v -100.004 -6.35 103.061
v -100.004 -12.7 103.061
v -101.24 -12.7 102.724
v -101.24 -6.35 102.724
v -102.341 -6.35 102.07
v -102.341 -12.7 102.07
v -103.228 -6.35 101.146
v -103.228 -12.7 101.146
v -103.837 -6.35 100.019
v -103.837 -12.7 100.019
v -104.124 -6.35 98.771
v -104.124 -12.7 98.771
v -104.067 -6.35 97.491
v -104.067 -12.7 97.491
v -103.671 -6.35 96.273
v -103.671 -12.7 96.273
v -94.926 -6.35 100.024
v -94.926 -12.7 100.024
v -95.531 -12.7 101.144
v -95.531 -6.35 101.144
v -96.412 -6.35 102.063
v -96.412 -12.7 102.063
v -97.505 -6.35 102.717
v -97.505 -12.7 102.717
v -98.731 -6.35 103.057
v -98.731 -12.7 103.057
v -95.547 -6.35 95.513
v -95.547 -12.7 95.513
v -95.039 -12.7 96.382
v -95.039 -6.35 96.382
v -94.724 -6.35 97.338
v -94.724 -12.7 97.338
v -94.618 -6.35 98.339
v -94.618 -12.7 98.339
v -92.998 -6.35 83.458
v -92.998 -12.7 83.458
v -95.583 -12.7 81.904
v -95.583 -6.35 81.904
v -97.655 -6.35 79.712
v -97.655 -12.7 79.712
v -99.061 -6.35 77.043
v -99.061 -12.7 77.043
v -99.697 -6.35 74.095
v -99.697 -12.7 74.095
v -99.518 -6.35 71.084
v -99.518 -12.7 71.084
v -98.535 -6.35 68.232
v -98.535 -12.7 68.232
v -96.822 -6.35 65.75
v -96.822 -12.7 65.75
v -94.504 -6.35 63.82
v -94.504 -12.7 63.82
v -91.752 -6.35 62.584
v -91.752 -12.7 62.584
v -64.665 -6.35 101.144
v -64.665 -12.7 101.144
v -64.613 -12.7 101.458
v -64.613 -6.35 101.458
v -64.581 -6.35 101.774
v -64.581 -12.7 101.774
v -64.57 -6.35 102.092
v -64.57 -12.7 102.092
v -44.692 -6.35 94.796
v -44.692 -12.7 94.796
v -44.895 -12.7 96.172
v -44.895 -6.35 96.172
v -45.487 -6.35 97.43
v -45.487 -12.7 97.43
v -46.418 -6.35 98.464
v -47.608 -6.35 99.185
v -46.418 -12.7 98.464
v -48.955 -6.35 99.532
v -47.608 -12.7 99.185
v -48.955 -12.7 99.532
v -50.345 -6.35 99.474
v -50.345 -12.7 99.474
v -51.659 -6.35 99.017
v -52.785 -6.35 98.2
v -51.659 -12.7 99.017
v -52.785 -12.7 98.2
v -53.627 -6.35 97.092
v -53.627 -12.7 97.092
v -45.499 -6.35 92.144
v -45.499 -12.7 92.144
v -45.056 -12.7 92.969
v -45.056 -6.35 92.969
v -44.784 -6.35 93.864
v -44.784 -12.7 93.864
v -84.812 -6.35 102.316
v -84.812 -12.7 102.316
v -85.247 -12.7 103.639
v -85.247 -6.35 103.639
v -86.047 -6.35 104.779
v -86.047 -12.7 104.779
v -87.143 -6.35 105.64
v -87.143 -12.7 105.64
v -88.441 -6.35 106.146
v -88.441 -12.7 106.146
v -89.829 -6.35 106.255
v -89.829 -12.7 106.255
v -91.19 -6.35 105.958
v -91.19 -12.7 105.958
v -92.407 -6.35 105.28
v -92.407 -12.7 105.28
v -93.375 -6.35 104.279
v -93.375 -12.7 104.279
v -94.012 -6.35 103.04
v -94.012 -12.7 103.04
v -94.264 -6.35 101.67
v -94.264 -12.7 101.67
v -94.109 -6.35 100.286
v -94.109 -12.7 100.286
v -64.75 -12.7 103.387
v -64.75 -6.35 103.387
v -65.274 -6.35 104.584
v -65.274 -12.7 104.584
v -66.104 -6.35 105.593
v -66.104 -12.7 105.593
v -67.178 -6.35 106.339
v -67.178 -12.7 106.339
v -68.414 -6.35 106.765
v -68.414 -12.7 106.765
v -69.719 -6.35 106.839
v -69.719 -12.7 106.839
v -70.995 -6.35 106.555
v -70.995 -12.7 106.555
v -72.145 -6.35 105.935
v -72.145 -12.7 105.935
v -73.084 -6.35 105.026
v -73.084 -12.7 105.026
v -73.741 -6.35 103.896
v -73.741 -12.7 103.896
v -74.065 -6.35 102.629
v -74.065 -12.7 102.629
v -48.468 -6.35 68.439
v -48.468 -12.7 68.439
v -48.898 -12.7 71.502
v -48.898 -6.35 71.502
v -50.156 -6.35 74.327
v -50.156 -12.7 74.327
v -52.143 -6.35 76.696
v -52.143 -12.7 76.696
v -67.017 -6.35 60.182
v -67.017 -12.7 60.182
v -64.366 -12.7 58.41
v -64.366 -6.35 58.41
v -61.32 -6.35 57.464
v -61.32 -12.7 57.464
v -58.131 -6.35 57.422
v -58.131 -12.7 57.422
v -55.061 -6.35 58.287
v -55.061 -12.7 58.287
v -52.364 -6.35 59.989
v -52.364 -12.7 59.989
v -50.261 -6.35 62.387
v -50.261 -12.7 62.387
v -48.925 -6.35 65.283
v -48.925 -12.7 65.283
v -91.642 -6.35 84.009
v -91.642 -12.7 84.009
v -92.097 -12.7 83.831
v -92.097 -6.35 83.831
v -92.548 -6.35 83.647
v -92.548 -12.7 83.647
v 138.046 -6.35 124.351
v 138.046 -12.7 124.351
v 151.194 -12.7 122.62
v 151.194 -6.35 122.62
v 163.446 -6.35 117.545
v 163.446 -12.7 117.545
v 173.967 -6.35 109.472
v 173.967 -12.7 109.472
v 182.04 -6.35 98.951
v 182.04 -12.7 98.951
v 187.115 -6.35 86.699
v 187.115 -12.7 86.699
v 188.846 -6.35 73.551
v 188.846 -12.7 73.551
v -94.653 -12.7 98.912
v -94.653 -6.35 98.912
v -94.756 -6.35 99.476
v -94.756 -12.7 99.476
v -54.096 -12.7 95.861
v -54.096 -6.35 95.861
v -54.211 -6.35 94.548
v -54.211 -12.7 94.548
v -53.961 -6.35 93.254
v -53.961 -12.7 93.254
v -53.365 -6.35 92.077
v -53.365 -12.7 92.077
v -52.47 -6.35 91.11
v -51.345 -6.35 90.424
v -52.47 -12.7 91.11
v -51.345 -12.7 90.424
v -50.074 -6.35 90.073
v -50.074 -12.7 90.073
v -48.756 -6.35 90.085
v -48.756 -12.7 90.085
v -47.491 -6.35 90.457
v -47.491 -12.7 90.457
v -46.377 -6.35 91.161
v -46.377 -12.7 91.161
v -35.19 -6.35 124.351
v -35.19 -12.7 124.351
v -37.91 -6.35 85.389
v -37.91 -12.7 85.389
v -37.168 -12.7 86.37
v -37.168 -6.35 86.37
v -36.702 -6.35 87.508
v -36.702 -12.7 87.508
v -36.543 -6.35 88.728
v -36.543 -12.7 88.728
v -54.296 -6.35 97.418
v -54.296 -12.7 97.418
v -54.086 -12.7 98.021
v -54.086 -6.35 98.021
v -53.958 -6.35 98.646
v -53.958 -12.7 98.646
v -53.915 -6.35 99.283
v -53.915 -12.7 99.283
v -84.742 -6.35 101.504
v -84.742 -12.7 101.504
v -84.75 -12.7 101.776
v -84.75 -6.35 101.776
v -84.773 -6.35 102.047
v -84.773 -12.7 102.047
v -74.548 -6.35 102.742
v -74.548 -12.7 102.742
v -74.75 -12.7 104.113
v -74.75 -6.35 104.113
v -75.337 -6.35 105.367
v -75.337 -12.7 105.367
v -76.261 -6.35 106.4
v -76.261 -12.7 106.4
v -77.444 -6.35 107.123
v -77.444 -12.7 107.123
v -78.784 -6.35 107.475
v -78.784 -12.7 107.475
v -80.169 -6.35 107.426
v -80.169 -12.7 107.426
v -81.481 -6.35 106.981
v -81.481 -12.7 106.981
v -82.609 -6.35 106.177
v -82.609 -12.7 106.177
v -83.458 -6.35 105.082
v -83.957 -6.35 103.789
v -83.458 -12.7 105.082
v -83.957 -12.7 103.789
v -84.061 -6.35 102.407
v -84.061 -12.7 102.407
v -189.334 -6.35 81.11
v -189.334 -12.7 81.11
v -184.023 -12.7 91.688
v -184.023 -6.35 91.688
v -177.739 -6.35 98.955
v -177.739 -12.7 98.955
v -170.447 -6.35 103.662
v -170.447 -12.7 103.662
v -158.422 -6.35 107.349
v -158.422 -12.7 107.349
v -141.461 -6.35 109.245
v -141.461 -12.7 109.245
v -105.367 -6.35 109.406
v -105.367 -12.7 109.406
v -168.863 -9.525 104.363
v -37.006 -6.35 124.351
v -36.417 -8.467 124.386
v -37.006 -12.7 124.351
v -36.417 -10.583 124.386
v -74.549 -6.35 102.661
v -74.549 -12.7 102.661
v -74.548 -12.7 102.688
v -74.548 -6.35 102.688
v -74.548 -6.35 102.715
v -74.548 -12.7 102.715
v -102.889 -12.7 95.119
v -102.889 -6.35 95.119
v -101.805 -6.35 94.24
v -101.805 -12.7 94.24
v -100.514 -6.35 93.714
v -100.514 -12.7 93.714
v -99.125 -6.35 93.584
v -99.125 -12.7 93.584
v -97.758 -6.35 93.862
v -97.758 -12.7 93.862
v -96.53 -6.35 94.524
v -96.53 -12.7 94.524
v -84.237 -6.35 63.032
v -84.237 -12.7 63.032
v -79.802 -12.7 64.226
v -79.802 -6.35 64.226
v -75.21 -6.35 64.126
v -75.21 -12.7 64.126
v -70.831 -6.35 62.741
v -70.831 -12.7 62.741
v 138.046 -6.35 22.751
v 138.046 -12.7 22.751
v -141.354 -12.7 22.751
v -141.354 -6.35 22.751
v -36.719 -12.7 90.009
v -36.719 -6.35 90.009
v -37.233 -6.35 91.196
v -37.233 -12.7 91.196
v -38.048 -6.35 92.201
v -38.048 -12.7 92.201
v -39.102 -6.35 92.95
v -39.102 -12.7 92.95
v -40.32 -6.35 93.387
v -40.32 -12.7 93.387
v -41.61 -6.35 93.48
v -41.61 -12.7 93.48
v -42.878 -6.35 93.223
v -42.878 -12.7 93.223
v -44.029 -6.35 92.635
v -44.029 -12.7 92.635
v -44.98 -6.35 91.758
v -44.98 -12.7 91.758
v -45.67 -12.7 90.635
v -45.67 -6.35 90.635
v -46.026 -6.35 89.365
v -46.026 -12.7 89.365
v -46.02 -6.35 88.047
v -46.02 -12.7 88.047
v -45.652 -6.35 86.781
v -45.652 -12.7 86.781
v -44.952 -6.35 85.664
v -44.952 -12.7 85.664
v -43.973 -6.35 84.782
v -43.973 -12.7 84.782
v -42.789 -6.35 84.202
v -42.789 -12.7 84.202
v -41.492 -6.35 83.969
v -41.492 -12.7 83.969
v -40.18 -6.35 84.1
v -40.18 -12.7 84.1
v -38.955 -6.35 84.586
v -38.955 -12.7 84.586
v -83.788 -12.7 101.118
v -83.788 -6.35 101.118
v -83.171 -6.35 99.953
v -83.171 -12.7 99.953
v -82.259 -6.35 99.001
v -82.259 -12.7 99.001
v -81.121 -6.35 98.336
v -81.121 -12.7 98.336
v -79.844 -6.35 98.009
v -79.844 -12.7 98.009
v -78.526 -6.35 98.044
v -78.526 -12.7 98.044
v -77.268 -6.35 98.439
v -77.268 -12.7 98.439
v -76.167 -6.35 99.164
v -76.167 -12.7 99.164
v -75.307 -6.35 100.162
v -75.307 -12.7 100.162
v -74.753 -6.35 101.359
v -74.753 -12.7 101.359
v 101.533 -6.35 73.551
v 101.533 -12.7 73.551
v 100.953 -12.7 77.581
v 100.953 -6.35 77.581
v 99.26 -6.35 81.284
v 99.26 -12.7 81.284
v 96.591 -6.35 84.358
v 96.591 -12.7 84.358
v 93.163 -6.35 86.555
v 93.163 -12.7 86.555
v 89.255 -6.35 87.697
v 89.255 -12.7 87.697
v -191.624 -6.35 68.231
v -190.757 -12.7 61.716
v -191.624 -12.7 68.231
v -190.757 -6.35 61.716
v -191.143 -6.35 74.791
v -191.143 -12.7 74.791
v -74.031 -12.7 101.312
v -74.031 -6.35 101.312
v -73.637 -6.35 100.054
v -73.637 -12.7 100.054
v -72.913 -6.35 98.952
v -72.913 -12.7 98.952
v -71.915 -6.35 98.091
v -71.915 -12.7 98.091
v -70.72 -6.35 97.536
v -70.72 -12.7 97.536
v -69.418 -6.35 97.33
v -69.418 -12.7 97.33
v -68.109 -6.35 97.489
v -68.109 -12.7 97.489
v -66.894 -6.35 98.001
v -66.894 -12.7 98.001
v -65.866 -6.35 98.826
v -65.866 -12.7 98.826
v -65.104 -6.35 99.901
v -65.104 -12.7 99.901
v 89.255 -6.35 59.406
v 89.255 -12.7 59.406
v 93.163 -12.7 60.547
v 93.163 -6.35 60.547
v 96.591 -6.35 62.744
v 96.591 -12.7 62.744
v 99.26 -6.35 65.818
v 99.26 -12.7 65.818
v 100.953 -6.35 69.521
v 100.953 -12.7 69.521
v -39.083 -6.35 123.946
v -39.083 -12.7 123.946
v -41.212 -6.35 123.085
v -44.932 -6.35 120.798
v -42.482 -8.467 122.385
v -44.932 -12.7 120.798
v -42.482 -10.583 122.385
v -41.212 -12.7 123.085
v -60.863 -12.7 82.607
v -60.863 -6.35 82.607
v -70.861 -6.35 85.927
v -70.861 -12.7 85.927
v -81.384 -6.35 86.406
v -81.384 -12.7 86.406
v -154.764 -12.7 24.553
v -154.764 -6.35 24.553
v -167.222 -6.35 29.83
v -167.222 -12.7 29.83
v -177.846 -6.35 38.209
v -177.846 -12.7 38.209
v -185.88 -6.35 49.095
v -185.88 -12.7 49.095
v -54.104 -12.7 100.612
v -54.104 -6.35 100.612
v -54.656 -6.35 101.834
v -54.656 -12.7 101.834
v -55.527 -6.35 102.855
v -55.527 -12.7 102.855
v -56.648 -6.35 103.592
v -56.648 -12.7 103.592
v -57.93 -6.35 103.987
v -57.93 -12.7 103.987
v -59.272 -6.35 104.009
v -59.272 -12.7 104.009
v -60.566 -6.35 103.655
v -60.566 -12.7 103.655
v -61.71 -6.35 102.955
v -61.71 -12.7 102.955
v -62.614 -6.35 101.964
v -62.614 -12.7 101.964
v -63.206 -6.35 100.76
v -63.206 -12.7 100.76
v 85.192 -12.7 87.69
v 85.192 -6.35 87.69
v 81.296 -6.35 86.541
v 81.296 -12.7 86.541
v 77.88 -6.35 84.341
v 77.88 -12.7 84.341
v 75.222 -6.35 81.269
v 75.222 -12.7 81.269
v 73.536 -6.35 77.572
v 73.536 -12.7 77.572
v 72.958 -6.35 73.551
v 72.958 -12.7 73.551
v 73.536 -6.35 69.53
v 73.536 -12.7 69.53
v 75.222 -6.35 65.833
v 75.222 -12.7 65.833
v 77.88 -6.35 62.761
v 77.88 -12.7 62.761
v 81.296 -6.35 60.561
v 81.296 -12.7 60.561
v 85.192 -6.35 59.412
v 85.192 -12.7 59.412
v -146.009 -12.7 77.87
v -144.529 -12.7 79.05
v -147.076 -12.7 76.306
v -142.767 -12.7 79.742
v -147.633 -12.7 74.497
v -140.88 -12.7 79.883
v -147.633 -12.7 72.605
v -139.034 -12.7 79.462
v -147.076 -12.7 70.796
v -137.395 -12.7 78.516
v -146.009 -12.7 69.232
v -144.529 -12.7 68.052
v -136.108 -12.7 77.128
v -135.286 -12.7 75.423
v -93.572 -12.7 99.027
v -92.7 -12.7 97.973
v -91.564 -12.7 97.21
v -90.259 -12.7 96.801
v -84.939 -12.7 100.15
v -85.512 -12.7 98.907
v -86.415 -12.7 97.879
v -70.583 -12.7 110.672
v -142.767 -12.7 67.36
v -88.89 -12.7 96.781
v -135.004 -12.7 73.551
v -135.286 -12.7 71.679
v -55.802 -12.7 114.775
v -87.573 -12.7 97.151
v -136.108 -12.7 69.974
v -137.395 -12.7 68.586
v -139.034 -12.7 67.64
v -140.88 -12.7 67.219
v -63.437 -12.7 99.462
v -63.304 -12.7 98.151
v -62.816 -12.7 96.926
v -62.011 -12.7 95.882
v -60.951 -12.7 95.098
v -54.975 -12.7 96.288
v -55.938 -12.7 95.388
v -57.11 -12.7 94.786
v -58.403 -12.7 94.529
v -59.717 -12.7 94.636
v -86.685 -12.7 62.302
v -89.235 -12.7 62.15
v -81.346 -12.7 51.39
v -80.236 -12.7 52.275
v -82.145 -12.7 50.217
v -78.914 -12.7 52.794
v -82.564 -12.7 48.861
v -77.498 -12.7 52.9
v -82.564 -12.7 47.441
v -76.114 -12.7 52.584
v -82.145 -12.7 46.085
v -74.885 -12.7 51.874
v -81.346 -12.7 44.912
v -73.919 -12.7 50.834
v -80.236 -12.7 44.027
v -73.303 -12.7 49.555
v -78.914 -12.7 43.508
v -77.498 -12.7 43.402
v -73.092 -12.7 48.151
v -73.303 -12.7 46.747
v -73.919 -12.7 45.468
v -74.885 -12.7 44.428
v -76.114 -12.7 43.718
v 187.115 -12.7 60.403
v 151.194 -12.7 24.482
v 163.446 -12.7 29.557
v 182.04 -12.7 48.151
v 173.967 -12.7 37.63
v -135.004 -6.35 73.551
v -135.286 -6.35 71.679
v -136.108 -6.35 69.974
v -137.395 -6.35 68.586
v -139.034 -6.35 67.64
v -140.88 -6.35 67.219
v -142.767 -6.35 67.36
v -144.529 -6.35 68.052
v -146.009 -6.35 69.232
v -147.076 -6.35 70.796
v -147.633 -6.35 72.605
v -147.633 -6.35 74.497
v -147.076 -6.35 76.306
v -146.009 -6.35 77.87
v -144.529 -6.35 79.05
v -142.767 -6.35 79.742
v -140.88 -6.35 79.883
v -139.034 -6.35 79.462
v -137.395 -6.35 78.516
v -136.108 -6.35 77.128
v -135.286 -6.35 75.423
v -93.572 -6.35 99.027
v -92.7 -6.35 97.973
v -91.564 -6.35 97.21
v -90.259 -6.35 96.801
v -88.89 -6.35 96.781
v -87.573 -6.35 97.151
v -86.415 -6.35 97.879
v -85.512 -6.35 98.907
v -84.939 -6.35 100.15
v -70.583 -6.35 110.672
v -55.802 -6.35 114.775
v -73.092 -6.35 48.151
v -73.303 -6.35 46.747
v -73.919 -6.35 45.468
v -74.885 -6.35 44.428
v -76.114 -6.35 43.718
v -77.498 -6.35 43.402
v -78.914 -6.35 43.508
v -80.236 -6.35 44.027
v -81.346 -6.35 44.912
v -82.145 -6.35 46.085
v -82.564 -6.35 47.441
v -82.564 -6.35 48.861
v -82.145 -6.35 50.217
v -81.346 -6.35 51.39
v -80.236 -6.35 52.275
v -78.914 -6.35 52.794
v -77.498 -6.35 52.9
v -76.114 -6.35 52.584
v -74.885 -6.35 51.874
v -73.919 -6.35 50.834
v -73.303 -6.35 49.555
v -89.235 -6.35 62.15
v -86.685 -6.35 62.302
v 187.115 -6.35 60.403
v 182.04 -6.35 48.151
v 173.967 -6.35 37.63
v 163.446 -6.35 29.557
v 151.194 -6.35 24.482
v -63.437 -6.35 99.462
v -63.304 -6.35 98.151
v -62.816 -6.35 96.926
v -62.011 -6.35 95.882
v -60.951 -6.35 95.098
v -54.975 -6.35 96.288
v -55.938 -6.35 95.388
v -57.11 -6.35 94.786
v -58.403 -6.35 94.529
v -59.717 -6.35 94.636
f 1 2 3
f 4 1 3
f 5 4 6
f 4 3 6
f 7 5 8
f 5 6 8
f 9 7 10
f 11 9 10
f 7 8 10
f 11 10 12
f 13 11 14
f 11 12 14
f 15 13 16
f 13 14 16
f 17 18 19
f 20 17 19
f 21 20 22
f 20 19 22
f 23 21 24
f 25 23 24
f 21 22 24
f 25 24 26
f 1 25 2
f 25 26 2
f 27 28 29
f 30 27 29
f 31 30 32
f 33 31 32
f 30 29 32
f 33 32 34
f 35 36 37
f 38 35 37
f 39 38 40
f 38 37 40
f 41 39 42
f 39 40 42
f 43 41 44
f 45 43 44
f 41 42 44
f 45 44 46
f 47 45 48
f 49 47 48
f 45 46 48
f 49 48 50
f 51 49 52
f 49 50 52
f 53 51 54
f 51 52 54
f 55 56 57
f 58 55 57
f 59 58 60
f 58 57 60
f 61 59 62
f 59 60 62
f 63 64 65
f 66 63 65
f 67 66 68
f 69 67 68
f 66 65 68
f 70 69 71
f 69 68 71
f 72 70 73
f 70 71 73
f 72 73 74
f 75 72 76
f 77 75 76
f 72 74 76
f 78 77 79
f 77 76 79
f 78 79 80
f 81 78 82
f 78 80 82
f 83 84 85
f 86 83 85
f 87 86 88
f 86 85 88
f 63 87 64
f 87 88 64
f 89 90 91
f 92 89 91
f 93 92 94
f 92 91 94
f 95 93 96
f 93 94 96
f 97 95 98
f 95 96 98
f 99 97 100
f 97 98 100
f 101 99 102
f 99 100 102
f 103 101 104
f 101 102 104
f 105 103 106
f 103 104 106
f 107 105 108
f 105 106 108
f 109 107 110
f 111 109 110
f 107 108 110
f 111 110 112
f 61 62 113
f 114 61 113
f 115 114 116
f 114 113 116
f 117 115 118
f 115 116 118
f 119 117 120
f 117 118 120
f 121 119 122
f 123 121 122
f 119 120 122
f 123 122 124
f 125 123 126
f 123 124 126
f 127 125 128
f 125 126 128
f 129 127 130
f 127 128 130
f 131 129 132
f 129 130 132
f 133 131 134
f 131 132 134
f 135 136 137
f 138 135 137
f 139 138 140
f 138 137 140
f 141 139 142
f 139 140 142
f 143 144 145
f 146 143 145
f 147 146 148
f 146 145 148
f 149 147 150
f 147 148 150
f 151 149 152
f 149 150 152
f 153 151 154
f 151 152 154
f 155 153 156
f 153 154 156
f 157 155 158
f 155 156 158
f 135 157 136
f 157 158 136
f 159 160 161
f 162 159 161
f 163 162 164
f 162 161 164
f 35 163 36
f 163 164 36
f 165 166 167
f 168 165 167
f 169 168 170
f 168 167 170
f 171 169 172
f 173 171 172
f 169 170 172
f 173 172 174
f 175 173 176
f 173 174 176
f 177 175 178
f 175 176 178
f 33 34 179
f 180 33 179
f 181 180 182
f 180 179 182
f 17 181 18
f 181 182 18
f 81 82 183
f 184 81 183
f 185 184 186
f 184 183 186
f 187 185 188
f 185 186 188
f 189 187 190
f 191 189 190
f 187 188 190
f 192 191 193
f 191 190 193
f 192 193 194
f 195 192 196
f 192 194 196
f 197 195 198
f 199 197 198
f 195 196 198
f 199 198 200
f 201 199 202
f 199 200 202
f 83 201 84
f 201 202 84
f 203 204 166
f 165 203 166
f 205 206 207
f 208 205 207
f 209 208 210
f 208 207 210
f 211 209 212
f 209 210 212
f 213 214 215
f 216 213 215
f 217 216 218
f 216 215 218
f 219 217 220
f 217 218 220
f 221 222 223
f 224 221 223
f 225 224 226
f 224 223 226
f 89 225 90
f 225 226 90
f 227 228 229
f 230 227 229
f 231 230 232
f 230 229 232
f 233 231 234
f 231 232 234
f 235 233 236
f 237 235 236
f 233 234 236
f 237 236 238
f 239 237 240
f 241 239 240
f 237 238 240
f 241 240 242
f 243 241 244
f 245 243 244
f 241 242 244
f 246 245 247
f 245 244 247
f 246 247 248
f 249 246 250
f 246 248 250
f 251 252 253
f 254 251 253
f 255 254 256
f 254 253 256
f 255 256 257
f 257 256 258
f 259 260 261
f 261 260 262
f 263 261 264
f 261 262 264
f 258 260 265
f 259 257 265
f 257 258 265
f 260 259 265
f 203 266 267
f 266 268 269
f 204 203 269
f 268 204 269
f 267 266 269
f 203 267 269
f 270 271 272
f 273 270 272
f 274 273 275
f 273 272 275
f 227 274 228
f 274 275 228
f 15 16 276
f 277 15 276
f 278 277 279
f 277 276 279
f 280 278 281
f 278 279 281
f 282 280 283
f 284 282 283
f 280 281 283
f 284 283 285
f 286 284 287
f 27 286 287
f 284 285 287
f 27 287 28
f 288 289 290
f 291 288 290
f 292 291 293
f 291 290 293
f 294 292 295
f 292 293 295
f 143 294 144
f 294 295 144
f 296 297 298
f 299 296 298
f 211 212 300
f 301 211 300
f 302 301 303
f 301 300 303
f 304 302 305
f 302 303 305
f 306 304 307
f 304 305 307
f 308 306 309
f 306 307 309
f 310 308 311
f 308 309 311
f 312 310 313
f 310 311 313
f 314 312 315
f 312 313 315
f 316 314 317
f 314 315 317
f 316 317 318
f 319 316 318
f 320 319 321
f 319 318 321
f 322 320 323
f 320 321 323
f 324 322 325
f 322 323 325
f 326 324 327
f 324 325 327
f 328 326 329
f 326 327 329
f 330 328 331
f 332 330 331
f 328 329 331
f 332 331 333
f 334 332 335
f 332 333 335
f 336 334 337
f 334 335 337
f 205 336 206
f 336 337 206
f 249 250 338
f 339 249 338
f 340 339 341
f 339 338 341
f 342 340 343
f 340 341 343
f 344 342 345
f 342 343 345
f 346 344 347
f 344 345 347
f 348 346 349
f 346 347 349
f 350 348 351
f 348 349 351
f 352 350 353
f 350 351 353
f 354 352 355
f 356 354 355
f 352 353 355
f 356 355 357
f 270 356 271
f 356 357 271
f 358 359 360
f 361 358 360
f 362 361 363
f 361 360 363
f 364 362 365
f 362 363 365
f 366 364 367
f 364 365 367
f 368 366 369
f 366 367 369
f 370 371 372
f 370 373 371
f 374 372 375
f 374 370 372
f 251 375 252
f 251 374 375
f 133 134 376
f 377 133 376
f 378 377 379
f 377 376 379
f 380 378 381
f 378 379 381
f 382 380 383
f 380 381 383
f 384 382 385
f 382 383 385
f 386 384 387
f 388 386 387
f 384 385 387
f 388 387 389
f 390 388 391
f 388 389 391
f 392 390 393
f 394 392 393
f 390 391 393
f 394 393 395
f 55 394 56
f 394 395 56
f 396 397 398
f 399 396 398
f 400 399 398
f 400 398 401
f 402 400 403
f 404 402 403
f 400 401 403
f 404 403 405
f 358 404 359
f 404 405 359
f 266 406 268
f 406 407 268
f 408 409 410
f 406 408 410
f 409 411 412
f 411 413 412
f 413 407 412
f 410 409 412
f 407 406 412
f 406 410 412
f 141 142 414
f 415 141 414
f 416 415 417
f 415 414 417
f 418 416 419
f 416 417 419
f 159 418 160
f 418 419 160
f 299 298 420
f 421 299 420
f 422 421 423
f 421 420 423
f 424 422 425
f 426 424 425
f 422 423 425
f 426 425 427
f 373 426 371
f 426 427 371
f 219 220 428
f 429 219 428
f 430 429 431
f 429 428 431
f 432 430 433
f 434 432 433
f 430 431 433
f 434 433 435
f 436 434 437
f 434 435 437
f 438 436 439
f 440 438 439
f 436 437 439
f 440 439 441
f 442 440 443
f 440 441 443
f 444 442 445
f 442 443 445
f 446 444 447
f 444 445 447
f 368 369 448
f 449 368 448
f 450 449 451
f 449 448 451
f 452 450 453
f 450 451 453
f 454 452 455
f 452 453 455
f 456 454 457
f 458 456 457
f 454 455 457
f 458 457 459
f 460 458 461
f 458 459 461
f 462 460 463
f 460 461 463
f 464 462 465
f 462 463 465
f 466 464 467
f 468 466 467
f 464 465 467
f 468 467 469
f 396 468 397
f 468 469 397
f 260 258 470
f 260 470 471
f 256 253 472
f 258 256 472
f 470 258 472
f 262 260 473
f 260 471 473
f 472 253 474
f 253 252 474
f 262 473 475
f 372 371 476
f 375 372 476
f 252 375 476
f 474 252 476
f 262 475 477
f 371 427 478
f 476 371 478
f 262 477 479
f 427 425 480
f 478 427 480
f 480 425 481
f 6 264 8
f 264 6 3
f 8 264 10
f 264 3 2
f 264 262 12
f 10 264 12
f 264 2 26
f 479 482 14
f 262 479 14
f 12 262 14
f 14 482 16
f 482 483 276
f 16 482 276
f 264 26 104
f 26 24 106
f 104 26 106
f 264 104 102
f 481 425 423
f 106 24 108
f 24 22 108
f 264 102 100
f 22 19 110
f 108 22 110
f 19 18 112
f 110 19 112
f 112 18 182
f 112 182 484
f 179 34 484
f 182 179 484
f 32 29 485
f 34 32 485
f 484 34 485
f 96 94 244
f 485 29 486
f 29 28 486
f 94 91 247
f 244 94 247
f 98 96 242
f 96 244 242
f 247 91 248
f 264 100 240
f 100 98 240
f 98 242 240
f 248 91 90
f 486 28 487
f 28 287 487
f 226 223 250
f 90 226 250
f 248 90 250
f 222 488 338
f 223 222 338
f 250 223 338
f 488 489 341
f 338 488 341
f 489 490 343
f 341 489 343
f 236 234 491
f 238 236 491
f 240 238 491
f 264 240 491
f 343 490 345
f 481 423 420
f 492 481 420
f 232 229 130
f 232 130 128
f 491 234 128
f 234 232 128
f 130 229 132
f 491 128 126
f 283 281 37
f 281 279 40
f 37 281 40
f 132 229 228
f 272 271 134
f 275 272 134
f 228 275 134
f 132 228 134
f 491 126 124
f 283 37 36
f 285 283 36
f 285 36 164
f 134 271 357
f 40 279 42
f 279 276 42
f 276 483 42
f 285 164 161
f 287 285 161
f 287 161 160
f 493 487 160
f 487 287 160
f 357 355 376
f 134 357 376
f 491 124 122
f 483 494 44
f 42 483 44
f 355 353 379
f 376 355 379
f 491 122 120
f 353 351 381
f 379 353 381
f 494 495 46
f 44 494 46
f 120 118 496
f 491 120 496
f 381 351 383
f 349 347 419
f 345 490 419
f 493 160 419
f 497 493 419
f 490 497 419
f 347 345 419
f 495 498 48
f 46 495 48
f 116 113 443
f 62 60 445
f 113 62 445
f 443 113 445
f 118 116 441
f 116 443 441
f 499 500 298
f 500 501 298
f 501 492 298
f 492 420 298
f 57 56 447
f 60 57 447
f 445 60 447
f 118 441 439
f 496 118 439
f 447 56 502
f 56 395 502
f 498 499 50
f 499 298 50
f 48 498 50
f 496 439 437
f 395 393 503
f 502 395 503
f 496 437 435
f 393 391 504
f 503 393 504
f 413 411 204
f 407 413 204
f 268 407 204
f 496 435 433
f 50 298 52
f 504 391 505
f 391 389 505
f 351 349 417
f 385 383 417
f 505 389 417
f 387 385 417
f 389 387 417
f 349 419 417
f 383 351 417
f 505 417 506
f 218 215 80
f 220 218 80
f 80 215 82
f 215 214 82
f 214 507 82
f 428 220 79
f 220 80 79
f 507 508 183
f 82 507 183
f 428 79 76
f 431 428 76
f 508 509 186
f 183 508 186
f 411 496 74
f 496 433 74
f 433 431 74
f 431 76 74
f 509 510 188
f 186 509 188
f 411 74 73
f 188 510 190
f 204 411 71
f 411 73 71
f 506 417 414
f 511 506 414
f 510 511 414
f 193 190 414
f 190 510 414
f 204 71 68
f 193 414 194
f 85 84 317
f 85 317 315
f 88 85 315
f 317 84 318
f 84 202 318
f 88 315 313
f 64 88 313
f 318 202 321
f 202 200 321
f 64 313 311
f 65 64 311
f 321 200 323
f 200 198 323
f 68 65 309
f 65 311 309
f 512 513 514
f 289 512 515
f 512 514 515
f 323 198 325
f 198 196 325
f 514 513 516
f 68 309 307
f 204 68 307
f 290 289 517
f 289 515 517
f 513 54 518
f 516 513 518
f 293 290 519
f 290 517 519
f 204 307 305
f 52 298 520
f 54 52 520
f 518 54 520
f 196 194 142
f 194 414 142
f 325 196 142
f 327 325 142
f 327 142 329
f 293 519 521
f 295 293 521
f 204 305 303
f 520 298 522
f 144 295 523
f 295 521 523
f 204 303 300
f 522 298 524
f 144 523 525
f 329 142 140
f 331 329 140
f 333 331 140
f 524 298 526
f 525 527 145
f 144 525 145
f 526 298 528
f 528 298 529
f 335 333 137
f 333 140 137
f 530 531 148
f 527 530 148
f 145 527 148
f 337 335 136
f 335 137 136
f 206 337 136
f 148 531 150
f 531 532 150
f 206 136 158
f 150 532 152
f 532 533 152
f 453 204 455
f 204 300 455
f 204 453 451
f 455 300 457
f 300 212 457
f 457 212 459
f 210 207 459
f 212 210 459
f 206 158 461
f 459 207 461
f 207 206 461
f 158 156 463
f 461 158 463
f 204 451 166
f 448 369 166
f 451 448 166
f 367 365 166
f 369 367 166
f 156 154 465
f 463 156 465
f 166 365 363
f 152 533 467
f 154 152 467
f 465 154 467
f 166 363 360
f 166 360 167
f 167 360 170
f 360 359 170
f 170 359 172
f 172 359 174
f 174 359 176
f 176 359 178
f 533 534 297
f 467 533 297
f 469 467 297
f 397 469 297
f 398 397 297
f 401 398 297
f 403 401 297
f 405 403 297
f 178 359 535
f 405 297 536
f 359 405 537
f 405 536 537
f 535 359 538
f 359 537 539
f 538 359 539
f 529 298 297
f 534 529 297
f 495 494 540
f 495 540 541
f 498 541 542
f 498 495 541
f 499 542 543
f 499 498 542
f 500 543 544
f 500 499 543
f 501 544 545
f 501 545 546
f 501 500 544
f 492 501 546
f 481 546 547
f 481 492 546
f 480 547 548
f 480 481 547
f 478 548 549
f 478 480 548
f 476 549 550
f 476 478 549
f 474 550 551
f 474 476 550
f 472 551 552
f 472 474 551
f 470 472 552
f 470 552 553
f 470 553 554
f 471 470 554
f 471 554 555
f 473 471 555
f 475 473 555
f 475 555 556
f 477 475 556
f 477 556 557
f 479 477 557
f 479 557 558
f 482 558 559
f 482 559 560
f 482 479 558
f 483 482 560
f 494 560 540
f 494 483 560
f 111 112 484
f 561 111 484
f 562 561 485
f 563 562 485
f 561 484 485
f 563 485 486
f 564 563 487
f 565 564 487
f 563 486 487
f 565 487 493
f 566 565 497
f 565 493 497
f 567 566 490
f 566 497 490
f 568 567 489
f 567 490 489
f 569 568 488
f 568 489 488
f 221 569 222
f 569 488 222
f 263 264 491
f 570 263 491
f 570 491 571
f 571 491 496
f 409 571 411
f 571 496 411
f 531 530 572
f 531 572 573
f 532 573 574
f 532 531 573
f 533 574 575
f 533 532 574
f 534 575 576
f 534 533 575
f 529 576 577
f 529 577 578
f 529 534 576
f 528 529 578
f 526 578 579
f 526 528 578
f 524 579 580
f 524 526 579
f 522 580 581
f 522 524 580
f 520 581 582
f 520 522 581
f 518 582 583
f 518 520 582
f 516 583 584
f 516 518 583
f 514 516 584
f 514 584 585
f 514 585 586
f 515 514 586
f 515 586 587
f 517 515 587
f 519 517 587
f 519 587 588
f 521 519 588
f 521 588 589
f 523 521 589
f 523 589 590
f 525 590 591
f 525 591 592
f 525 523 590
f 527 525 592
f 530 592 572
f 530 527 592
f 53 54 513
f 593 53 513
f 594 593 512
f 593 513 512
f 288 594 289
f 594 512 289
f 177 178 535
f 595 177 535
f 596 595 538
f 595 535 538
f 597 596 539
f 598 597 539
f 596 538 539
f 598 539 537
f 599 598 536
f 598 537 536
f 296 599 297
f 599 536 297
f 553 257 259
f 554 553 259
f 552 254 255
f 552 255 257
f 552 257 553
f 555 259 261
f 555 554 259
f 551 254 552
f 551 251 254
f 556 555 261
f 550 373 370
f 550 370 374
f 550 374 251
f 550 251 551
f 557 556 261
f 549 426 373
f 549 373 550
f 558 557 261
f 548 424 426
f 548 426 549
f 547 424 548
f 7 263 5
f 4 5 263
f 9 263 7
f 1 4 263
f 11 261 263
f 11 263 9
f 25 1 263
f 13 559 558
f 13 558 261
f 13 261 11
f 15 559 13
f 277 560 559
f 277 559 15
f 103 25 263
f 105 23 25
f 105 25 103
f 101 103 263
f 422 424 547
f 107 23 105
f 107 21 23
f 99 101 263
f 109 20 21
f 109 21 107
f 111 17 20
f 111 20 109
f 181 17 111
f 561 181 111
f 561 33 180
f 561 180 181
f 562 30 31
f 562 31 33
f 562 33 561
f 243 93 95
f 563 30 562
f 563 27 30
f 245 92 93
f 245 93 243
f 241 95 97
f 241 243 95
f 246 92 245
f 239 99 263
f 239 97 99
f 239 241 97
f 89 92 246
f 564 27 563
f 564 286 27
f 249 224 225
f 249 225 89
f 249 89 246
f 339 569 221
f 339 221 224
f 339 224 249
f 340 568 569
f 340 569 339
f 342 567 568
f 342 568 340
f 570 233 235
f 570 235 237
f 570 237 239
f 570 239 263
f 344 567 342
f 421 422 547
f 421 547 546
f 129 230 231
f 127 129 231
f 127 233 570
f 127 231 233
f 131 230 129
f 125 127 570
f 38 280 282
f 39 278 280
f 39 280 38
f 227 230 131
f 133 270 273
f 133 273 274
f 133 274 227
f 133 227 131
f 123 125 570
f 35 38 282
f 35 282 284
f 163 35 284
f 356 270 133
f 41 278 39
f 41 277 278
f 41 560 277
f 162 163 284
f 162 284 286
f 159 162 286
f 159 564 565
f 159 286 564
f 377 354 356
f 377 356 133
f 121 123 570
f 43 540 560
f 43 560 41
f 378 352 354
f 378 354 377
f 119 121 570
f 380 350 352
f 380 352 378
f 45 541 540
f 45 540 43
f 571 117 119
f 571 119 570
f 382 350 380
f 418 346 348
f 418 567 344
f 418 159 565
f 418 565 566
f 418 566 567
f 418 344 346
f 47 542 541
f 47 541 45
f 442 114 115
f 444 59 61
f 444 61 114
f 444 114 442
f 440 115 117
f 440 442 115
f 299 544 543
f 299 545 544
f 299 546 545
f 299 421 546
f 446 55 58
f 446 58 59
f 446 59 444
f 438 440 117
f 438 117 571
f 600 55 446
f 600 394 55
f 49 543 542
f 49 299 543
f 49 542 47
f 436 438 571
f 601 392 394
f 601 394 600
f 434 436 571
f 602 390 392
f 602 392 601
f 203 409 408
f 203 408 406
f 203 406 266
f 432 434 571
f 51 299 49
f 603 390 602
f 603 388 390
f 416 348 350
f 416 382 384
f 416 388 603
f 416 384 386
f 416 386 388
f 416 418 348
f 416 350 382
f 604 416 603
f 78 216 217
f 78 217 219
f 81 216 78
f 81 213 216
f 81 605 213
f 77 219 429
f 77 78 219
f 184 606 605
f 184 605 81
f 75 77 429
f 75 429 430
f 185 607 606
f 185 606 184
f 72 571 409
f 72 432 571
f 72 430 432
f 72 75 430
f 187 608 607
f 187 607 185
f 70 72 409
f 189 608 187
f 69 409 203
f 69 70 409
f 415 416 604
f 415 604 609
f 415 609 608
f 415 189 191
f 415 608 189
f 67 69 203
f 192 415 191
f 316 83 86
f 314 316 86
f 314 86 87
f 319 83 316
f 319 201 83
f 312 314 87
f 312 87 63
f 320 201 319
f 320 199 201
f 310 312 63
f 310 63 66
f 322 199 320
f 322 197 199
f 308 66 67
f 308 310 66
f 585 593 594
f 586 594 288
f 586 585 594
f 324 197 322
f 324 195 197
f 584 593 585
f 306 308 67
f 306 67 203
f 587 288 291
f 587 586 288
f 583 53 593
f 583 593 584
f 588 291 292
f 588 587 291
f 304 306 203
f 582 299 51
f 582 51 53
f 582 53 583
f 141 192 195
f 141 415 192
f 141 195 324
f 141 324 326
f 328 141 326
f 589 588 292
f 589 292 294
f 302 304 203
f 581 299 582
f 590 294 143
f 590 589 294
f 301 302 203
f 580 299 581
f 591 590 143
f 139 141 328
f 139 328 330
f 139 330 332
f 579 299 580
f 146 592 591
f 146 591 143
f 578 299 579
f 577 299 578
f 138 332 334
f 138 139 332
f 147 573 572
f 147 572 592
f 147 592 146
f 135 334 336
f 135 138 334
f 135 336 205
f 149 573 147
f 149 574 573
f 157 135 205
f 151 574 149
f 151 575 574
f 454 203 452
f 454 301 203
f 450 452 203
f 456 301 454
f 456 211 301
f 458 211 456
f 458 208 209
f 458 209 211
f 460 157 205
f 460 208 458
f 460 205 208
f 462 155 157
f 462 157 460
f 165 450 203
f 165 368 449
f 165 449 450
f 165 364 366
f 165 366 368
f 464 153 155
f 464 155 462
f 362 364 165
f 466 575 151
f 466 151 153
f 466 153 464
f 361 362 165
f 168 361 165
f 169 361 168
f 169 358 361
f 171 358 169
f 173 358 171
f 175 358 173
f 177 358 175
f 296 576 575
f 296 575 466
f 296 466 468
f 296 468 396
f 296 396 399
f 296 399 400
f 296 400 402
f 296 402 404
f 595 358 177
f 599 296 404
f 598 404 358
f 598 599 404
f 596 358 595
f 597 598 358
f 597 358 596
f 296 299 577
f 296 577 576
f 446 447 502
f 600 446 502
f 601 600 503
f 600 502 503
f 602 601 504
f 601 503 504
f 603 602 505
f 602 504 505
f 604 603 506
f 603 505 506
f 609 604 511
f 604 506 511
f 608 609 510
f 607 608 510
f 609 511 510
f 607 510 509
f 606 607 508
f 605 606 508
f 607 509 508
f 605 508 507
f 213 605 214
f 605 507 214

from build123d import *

# Parameters (mm, degrees)
F0_R     = 6.35
F0_R_2   = 4.7625
F1_DEPTH = 6.35
F2_R     = 32.0379747342
F3_ANGLE = 180


with BuildPart() as f1:
    # F0 (on Front) → F1 (new body)
    with BuildSketch(Plane.XZ):
        with BuildLine():
            add(Edge.make_bspline(
                [(-44.9317906939, -75.2959670142), (-42.504350489, -76.9309330496), (-40.0815580843, -78.574281615), (-37.0058182453, -78.848974732)],
                knots=[0, 0, 0, 0, 0.304878312, 0.304878312, 0.304878312, 0.304878312], degree=3))
            Line((-37.0058182453, -78.848974732), (-35.1899303496, -78.848974732))
            Line((-35.1899303496, -78.848974732), (138.0456507325, -78.848974732))
            ThreePointArc((138.0456507325, -78.848974732), (107.5329699783, -68.6644436224), (89.25483042, -42.1944988733))
            ThreePointArc((89.25483042, -42.1944988733), (72.9581507325, -28.048974732), (89.25483042, -13.9034505906))
            ThreePointArc((89.25483042, -13.9034505906), (107.5329699783, 12.5664941585), (138.0456507325, 22.751025268))
            Line((138.0456507325, 22.751025268), (-29.5108688384, 22.751025268))
            ThreePointArc((-29.5108688384, 22.751025268), (-23.7287326375, -9.9063657522), (-37.9096431739, -39.8870272468))
            ThreePointArc((-37.9096431739, -39.8870272468), (-36.8982172715, -41.4219866867), (-36.5434579184, -43.2256575657))
            ThreePointArc((-36.5434579184, -43.2256575657), (-39.6962005674, -47.7078542952), (-44.9802400795, -46.2556834486))
            ThreePointArc((-44.9802400795, -46.2556834486), (-45.2388732076, -46.4494635579), (-45.4986485664, -46.6417097247))
            ThreePointArc((-45.4986485664, -46.6417097247), (-44.8982077868, -47.9076096174), (-44.6921152233, -49.2934514277))
            ThreePointArc((-44.6921152233, -49.2934514277), (-48.2687720926, -53.9059542537), (-53.62657499, -51.5904403165))
            ThreePointArc((-53.62657499, -51.5904403165), (-53.9605685551, -51.7543648971), (-54.2956711641, -51.9160102225))
            ThreePointArc((-54.2956711641, -51.9160102225), (-54.0112987886, -52.8294235617), (-53.9152156835, -53.781242669))
            ThreePointArc((-53.9152156835, -53.781242669), (-57.9302793656, -58.484724911), (-63.2056073689, -55.2575905738))
            ThreePointArc((-63.2056073689, -55.2575905738), (-63.9341966135, -55.4550487206), (-64.6654456429, -55.6424169789))
            ThreePointArc((-64.6654456429, -55.6424169789), (-64.5940899046, -56.1138214868), (-64.5702249334, -56.589998255))
            ThreePointArc((-64.5702249334, -56.589998255), (-69.063627601, -61.3448897233), (-74.0648151174, -57.1273331041))
            ThreePointArc((-74.0648151174, -57.1273331041), (-74.3067807591, -57.1436245398), (-74.5488163621, -57.1588412904))
            ThreePointArc((-74.5488163621, -57.1588412904), (-74.5483033729, -57.1991961718), (-74.5481323724, -57.2395539515))
            ThreePointArc((-74.5481323724, -57.2395539515), (-79.4779726733, -61.9991131195), (-84.0613726764, -56.9050800143))
            ThreePointArc((-84.0613726764, -56.9050800143), (-84.4367274692, -56.8608221199), (-84.811766966, -56.8139674761))
            ThreePointArc((-84.811766966, -56.8139674761), (-90.5205103625, -60.6546823767), (-94.1086444598, -54.7838957332))
            ThreePointArc((-94.1086444598, -54.7838957332), (-94.5178427862, -54.6545521612), (-94.926012036, -54.5219969142))
            ThreePointArc((-94.926012036, -54.5219969142), (-96.9364048452, -56.9248041814), (-100.0044999501, -57.5588029495))
            ThreePointArc((-100.0044999501, -57.5588029495), (-102.555846588, -60.8409888487), (-105.3670203015, -63.9035721205))
            add(Edge.make_bspline(
                [(-105.3670203015, -63.9035721205), (-93.0623740032, -63.7395817927), (-65.1691332268, -63.6755764129), (-51.7450297958, -70.7164798851), (-44.9317906939, -75.2959670142)],
                knots=[0.5750167778, 0.5750167778, 0.5750167778, 0.5750167778, 0.7300492168, 0.9453128196, 0.9453128196, 0.9453128196, 0.9453128196], degree=3))
        make_face()
        with BuildLine():
            Line((-35.1899303496, -78.848974732), (-37.0058182453, -78.848974732))
            add(Edge.make_bspline(
                [(-37.0058182453, -78.848974732), (-36.4252596683, -78.9008241905), (-35.8214378024, -78.9039110297), (-35.1899303496, -78.848974732)],
                knots=[0.304878312, 0.304878312, 0.304878312, 0.304878312, 0.3624253505, 0.3624253505, 0.3624253505, 0.3624253505], degree=3))
        make_face()
        with BuildLine():
            ThreePointArc((89.25483042, -42.1944988733), (107.5329699783, -68.6644436224), (138.0456507325, -78.848974732))
            ThreePointArc((138.0456507325, -78.848974732), (173.9666752168, -63.9699992163), (188.8456507325, -28.048974732))
            ThreePointArc((188.8456507325, -28.048974732), (173.9666752168, 7.8720497523), (138.0456507325, 22.751025268))
            ThreePointArc((138.0456507325, 22.751025268), (107.5329699783, 12.5664941585), (89.25483042, -13.9034505906))
            ThreePointArc((89.25483042, -13.9034505906), (98.0354331918, -18.6834394706), (101.5331507325, -28.048974732))
            ThreePointArc((101.5331507325, -28.048974732), (98.0354331918, -37.4145099934), (89.25483042, -42.1944988733))
        make_face()
        with BuildLine():
            add(Edge.make_bspline(
                [(-192.1543492675, -28.048974732), (-187.686217537, -40.4827740106), (-178.5952669037, -65.7808319564), (-128.5743222399, -64.2128677281), (-105.3670203015, -63.9035721205)],
                knots=[0, 0, 0, 0, 0.2826162867, 0.5750167778, 0.5750167778, 0.5750167778, 0.5750167778], degree=3))
            ThreePointArc((-105.3670203015, -63.9035721205), (-102.555846588, -60.8409888487), (-100.0044999501, -57.5588029495))
            ThreePointArc((-100.0044999501, -57.5588029495), (-103.5707491501, -55.1009846293), (-103.6714716912, -50.7709893382))
            ThreePointArc((-103.6714716912, -50.7709893382), (-99.8239881538, -48.0955305832), (-95.5471956554, -50.0113215546))
            ThreePointArc((-95.5471956554, -50.0113215546), (-93.2496774257, -44.3762692721), (-91.6424653425, -38.5069189195))
            ThreePointArc((-91.6424653425, -38.5069189195), (-92.322764275, -38.2378672888), (-92.9978166414, -37.9559103416))
            ThreePointArc((-92.9978166414, -37.9559103416), (-99.7102448029, -27.0812609993), (-91.7522812468, -17.0819857164))
            ThreePointArc((-91.7522812468, -17.0819857164), (-104.2898917661, 6.6910020977), (-127.2022100568, 20.7399272413))
            ThreePointArc((-127.2022100568, 20.7399272413), (-134.2071897004, 22.2457378144), (-141.3543492675, 22.751025268))
            ThreePointArc((-141.3543492675, 22.751025268), (-177.2753737518, 7.8720497523), (-192.1543492675, -28.048974732))
        make_face()
        with Locations((-141.3543492675, -28.048974732)):
            Circle(F0_R, mode=Mode.SUBTRACT)
        with BuildLine():
            ThreePointArc((-94.6181004106, -52.8373460118), (-94.6957106902, -53.6936254977), (-94.926012036, -54.5219969142))
            ThreePointArc((-94.926012036, -54.5219969142), (-94.5178427862, -54.6545521612), (-94.1086444598, -54.7838957332))
            ThreePointArc((-94.1086444598, -54.7838957332), (-88.8904205988, -51.2790749892), (-84.7420081356, -56.0018181271))
            ThreePointArc((-84.7420081356, -56.0018181271), (-84.7594798917, -56.4093880167), (-84.811766966, -56.8139674761))
            ThreePointArc((-84.811766966, -56.8139674761), (-84.4367274692, -56.8608221199), (-84.0613726764, -56.9050800143))
            ThreePointArc((-84.0613726764, -56.9050800143), (-79.1836309389, -52.4787476242), (-74.5488163621, -57.1588412904))
            ThreePointArc((-74.5488163621, -57.1588412904), (-74.3067807591, -57.1436245398), (-74.0648151174, -57.1273331041))
            ThreePointArc((-74.0648151174, -57.1273331041), (-70.0758898462, -51.8858392268), (-64.6654456429, -55.6424169789))
            ThreePointArc((-64.6654456429, -55.6424169789), (-63.9341966135, -55.4550487206), (-63.2056073689, -55.2575905738))
            ThreePointArc((-63.2056073689, -55.2575905738), (-60.3500965193, -49.3220332559), (-54.2956711641, -51.9160102225))
            ThreePointArc((-54.2956711641, -51.9160102225), (-53.9605685551, -51.7543648971), (-53.62657499, -51.5904403165))
            ThreePointArc((-53.62657499, -51.5904403165), (-51.9313362155, -45.2256191577), (-45.4986485664, -46.6417097247))
            ThreePointArc((-45.4986485664, -46.6417097247), (-45.2388732076, -46.4494635579), (-44.9802400795, -46.2556834486))
            ThreePointArc((-44.9802400795, -46.2556834486), (-44.493317629, -39.6869933651), (-37.9096431739, -39.8870272468))
            ThreePointArc((-37.9096431739, -39.8870272468), (-23.7287326375, -9.9063657522), (-29.5108688384, 22.751025268))
            Line((-29.5108688384, 22.751025268), (-126.1978296966, 22.751025268))
            ThreePointArc((-126.1978296966, 22.751025268), (-126.7103690202, 21.7506448125), (-127.2022100568, 20.7399272413))
            ThreePointArc((-127.2022100568, 20.7399272413), (-104.2898917661, 6.6910020977), (-91.7522812468, -17.0819857164))
            ThreePointArc((-91.7522812468, -17.0819857164), (-87.9555754664, -16.6503904081), (-84.2371330367, -17.5304104022))
            ThreePointArc((-84.2371330367, -17.5304104022), (-75.2103646617, -18.6241555339), (-67.0173262512, -14.6804330141))
            ThreePointArc((-67.0173262512, -14.6804330141), (-55.0611893817, -12.7851430462), (-48.4676535929, -22.9373161489))
            ThreePointArc((-48.4676535929, -22.9373161489), (-49.4279804902, -27.4562803601), (-52.1429809347, -31.1941992836))
            ThreePointArc((-52.1429809347, -31.1941992836), (-70.8607841381, -40.4245535235), (-91.6424653425, -38.5069189195))
            ThreePointArc((-91.6424653425, -38.5069189195), (-93.2496774257, -44.3762692721), (-95.5471956554, -50.0113215546))
            ThreePointArc((-95.5471956554, -50.0113215546), (-94.8563327131, -51.3499294422), (-94.6181004106, -52.8373460118))
        make_face()
        with Locations((-77.8543492675, -2.648974732)):
            Circle(F0_R_2, mode=Mode.SUBTRACT)
        with BuildLine():
            Line((-126.1978296966, 22.751025268), (-141.3543492675, 22.751025268))
            ThreePointArc((-141.3543492675, 22.751025268), (-134.2071897004, 22.2457378144), (-127.2022100568, 20.7399272413))
            ThreePointArc((-127.2022100568, 20.7399272413), (-126.7103690202, 21.7506448125), (-126.1978296966, 22.751025268))
        make_face()
    extrude(amount=F1_DEPTH)

    # F2
    f2_edges = [f1.edges().sort_by_distance(p)[0] for p in [
        (-192.154349, -3.175, -28.048975),
    ]]
    fillet(f2_edges, radius=F2_R)


with BuildPart() as f1_1:
    # F3: moved
    add(f1.part.rotate(Axis((-1.6543492675, -6.35, 22.751025268), (1, 0, 0)), F3_ANGLE))


solid = f1_1.part
